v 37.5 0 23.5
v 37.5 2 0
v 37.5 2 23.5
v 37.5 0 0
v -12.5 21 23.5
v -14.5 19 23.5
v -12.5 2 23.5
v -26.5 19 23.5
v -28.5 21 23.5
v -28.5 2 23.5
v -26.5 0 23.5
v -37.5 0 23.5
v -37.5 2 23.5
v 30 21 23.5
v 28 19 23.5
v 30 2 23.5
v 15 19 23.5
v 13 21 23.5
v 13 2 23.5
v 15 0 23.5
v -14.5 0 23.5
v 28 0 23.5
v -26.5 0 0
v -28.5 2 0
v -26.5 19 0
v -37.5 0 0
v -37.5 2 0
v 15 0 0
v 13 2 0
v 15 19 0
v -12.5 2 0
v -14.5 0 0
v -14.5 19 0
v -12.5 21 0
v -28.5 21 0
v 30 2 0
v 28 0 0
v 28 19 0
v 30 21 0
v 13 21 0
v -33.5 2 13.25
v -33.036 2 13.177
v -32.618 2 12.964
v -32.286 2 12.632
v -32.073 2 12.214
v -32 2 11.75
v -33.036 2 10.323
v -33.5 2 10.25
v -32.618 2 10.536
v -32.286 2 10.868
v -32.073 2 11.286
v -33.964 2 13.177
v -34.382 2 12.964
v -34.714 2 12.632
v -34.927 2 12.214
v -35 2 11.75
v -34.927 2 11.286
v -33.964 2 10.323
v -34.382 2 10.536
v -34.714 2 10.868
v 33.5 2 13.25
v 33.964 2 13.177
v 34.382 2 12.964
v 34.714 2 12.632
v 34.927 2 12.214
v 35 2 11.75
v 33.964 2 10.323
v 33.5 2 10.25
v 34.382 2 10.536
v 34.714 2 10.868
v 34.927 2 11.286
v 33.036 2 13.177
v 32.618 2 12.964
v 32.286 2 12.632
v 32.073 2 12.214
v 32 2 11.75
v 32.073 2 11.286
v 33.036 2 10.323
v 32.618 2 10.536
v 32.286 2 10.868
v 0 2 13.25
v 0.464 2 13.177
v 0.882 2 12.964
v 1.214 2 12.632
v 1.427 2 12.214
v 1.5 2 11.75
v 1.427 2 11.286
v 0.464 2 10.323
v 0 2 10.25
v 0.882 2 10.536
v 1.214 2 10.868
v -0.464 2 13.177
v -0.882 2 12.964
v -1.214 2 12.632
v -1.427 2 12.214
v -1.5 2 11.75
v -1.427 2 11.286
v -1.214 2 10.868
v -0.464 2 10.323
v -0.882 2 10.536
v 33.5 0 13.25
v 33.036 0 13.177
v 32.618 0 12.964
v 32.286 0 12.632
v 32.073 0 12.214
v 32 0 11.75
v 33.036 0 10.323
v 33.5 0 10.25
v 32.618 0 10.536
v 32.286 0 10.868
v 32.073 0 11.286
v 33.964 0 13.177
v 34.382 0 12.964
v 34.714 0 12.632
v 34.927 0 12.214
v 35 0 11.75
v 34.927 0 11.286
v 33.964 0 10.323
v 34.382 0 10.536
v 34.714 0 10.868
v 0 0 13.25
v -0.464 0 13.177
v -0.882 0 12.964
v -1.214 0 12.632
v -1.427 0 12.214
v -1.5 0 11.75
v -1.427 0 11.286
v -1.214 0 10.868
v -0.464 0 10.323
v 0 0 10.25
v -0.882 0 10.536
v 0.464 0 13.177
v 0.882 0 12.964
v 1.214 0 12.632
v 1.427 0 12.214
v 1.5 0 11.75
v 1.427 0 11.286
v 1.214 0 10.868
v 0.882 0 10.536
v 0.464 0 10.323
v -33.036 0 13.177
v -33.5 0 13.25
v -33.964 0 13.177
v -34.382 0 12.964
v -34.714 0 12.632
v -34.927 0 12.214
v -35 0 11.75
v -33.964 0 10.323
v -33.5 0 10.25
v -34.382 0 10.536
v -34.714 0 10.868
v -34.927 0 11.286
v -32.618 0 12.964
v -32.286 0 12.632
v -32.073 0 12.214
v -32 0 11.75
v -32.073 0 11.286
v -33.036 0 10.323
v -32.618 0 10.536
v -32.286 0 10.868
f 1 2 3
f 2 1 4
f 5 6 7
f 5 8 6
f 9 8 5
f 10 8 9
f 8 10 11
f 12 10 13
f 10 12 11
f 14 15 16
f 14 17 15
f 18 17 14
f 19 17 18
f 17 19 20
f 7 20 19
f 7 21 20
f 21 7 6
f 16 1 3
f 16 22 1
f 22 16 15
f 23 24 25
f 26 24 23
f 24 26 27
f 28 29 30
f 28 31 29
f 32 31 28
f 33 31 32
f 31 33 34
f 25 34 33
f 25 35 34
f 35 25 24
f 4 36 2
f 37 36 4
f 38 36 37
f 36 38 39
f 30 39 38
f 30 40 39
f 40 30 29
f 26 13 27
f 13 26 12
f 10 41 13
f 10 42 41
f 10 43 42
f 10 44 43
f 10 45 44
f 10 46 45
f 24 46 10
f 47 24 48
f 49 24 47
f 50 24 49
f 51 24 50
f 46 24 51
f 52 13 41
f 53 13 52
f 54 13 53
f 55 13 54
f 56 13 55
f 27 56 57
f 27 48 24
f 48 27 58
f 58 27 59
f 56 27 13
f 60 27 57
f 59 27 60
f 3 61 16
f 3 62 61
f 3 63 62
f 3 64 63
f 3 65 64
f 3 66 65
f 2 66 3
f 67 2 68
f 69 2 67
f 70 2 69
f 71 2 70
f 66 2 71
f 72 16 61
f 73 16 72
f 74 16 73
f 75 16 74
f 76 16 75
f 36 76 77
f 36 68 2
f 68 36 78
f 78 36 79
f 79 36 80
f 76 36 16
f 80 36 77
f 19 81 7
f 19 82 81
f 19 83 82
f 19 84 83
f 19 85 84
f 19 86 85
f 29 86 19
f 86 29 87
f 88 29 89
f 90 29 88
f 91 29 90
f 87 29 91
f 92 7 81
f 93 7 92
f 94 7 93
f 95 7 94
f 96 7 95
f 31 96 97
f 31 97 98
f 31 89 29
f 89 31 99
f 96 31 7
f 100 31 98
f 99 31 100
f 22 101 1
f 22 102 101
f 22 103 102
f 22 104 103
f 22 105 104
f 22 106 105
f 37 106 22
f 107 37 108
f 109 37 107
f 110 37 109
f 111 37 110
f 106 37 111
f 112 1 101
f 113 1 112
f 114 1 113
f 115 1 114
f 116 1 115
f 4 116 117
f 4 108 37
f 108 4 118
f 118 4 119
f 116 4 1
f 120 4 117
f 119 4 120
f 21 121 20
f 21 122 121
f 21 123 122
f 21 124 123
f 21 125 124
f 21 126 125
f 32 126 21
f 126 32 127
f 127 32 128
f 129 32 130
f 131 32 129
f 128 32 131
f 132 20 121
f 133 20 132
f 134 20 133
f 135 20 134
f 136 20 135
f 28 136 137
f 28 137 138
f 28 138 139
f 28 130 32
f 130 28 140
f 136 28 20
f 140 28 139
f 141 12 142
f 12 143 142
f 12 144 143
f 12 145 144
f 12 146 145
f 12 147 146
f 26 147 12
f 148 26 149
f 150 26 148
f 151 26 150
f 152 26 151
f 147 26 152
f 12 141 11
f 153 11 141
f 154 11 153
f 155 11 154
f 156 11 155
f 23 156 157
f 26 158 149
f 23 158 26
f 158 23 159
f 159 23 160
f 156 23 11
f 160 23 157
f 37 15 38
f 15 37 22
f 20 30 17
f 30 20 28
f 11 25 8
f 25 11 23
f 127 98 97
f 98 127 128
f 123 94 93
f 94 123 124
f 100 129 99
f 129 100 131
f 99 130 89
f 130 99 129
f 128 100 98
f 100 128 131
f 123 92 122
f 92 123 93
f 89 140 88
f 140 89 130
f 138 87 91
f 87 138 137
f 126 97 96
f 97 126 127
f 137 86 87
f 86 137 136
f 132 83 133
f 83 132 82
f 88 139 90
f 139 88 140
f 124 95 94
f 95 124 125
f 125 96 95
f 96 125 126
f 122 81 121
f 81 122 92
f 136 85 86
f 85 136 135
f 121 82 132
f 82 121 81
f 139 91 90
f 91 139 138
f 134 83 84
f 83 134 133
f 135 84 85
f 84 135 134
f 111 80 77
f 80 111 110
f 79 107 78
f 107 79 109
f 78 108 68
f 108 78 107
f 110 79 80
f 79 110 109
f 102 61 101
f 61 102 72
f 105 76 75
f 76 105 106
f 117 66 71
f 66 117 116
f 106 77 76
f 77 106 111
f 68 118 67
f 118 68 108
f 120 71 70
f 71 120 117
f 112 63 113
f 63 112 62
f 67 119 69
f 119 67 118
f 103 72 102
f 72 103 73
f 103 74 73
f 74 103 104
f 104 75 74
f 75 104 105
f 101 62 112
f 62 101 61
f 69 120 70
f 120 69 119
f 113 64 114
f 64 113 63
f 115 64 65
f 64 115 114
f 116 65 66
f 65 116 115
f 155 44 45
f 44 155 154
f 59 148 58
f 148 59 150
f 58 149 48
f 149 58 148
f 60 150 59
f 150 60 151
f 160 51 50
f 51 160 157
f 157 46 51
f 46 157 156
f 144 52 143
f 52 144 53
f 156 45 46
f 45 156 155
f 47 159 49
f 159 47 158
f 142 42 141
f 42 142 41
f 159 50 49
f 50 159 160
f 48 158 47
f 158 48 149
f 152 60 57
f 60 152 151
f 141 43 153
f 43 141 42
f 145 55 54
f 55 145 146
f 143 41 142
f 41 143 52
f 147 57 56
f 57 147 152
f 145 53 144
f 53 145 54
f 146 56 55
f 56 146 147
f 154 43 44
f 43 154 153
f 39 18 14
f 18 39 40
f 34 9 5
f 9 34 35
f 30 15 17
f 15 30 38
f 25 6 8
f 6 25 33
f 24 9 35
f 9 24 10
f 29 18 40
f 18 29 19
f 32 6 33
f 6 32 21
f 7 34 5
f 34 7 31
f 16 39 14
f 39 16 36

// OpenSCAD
LARGO_PIEZA_PRINCIPAL = 75;

DIAMETRO_CILINDROS = 3;
ALTURA_CILINDROS = 10;

LARGO_PIEZAS_TRANSVERSALES = 21;
ANCHO_PIEZAS_TRANSVERSALES = 2;
ALTO_PIEZAS_TRANSVERSALES = 23.5;
//parte frontal
difference(){
    
translate([-LARGO_PIEZA_PRINCIPAL/2,0,0])
cube([LARGO_PIEZA_PRINCIPAL,2,23.5]);
    
translate([30/2,-7/2,-5])
cube([13,10,30]);
    
translate([-35/2+1-20/2,-7/2,-5])
cube([12.5,15,30]);
    
translate([0,-5,ALTO_PIEZAS_TRANSVERSALES/2])
rotate([0,90,90])
cylinder(h=ALTURA_CILINDROS, d=DIAMETRO_CILINDROS,$fn = 20);
    
translate([LARGO_PIEZA_PRINCIPAL/2-4,-5,ALTO_PIEZAS_TRANSVERSALES/2])
rotate([0,90,90])
cylinder(h=ALTURA_CILINDROS, d=DIAMETRO_CILINDROS,$fn = 20);
    
translate([-LARGO_PIEZA_PRINCIPAL/2+4,-5,ALTO_PIEZAS_TRANSVERSALES/2])
rotate([0,90,90])
cylinder(h=ALTURA_CILINDROS, d=DIAMETRO_CILINDROS,$fn = 20);
}

//parte trasera
difference(){
    
    
translate([-LARGO_PIEZA_PRINCIPAL/2,19,0])
cube([LARGO_PIEZA_PRINCIPAL,2,23.5]);
    
translate([-30/2+1,17,-5])
cube([29,10,30]);
    
translate([-LARGO_PIEZA_PRINCIPAL/2-1,17,-5])
cube([10,15,30]);
    
translate([LARGO_PIEZA_PRINCIPAL/2-9,17,-5])
cube([10,15,30]);

}


//partes transversales

translate([15,0,0])
rotate([0,0,90])
cube([LARGO_PIEZAS_TRANSVERSALES,ANCHO_PIEZAS_TRANSVERSALES,ALTO_PIEZAS_TRANSVERSALES]);

translate([15,0,0])
rotate([0,0,90])
cube([LARGO_PIEZAS_TRANSVERSALES,ANCHO_PIEZAS_TRANSVERSALES,ALTO_PIEZAS_TRANSVERSALES]);

translate([-12.5,,0])
rotate([0,0,90])
cube([LARGO_PIEZAS_TRANSVERSALES,ANCHO_PIEZAS_TRANSVERSALES,ALTO_PIEZAS_TRANSVERSALES]);

translate([-26.5,0,0])
rotate([0,0,90])
cube([LARGO_PIEZAS_TRANSVERSALES,ANCHO_PIEZAS_TRANSVERSALES,ALTO_PIEZAS_TRANSVERSALES]);

translate([30,0,0])
rotate([0,0,90])
cube([LARGO_PIEZAS_TRANSVERSALES,ANCHO_PIEZAS_TRANSVERSALES,ALTO_PIEZAS_TRANSVERSALES]);
